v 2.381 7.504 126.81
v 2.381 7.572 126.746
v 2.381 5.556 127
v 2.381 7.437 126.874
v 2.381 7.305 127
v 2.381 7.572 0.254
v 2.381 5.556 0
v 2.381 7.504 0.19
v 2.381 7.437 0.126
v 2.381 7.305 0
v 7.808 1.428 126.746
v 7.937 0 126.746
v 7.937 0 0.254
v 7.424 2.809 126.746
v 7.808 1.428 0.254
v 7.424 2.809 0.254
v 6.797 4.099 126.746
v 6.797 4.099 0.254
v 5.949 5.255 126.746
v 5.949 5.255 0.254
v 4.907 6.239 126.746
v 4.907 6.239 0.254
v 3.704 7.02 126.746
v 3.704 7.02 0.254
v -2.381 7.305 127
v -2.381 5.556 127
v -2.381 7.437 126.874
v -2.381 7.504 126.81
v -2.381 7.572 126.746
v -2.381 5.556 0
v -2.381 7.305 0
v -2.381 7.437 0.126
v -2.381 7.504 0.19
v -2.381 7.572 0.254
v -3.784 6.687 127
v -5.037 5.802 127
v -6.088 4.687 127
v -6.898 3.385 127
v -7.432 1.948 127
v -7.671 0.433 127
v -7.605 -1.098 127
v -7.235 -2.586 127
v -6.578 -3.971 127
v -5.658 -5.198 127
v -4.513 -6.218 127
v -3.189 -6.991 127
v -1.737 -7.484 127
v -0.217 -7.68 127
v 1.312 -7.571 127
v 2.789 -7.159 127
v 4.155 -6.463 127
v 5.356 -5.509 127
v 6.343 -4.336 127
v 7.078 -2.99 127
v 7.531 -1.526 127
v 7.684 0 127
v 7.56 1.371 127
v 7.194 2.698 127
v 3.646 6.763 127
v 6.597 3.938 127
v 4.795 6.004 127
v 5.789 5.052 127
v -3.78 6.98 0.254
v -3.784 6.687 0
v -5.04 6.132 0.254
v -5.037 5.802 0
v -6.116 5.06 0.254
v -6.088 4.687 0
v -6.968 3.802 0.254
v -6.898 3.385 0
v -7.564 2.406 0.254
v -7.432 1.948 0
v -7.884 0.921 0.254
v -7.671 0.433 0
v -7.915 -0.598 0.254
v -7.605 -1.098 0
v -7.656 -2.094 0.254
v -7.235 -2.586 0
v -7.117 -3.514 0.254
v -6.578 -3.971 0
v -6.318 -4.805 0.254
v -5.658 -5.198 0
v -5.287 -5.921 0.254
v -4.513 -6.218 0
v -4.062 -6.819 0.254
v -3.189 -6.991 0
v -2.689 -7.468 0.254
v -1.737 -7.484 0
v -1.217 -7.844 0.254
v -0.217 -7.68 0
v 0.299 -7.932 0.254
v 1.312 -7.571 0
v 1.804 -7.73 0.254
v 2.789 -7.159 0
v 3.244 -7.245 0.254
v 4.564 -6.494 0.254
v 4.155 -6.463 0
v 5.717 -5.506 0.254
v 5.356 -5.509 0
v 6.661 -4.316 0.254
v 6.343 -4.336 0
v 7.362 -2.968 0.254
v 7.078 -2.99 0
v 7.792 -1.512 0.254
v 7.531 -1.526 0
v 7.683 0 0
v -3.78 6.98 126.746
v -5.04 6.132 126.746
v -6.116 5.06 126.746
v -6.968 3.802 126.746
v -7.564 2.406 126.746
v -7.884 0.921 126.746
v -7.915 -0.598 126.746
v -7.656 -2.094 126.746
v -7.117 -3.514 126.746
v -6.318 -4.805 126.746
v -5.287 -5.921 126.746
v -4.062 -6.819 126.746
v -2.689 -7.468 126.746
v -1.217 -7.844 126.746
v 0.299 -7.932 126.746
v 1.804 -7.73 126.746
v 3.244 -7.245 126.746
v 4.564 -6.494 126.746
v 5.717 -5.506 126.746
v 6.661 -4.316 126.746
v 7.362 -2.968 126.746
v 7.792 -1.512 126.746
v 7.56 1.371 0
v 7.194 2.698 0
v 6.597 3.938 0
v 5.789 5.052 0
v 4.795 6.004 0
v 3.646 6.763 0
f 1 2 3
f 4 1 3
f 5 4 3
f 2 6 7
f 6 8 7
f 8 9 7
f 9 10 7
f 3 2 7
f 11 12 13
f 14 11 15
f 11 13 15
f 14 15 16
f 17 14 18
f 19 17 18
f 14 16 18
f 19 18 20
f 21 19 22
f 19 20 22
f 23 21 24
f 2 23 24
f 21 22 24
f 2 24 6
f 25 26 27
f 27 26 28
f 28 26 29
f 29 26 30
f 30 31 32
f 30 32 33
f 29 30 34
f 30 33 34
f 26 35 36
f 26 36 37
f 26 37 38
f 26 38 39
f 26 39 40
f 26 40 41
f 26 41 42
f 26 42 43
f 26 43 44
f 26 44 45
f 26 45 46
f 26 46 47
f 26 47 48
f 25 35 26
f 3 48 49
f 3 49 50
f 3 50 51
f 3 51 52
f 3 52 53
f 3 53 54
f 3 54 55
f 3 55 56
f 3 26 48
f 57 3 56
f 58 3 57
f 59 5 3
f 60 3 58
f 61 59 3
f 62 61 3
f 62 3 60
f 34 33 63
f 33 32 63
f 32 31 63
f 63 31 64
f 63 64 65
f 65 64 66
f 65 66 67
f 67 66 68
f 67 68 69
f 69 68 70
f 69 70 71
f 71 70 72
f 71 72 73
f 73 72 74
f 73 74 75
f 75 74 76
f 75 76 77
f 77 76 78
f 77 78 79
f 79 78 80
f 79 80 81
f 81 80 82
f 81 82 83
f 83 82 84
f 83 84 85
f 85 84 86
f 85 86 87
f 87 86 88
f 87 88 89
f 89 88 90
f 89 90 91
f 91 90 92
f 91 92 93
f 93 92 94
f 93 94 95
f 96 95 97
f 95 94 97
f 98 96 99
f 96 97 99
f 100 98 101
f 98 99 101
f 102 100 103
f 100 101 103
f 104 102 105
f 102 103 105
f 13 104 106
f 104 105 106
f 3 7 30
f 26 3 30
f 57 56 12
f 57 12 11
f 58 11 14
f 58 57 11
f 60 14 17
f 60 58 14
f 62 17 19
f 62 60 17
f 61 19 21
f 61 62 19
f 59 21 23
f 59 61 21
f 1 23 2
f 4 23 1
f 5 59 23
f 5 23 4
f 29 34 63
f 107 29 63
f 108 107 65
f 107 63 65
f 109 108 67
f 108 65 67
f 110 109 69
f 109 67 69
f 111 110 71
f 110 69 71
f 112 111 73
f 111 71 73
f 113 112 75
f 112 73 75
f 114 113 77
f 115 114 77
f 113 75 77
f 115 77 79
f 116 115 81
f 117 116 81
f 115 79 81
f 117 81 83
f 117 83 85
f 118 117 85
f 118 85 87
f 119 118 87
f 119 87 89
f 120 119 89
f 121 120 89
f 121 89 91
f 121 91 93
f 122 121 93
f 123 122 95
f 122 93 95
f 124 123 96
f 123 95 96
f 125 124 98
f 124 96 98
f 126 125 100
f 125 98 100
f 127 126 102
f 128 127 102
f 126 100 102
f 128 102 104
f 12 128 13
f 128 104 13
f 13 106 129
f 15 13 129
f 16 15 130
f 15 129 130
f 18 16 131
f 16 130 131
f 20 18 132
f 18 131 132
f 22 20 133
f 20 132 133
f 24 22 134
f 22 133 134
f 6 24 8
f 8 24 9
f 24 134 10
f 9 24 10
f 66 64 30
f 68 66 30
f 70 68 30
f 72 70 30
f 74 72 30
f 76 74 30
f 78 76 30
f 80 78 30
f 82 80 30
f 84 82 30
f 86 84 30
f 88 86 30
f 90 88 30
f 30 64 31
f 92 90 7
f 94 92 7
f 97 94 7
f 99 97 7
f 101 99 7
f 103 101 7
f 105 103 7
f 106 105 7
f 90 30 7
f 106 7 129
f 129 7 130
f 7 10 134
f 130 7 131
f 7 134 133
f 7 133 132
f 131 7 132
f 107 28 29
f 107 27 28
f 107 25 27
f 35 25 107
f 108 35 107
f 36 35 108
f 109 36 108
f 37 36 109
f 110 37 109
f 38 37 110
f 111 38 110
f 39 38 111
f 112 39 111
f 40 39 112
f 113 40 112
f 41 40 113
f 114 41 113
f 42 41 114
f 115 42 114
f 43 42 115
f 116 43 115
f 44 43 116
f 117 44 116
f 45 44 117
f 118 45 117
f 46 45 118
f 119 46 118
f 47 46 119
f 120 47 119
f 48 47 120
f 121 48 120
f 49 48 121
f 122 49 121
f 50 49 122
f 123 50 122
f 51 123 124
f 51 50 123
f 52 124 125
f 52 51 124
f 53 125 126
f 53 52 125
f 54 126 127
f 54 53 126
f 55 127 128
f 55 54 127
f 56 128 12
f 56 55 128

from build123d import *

# Parameters (mm, degrees)
BOSS_EXTRUDE1_DEPTH = 127
CHAMFER1_SIZE       = 0.254


with BuildPart() as part:
    # Sketch1 → Boss-Extrude1 (new body)
    with BuildSketch(Plane.XY):
        with BuildLine():
            Line((2.38125, 5.55625), (-2.38125, 5.55625))
            Line((-2.38125, 5.55625), (-2.38125, 7.571892411))
            ThreePointArc((-2.38125, 7.571892411), (-4.695888328, -6.399417088), (7.9375, 0))
            ThreePointArc((7.9375, 0), (6.399417088, 4.695888328), (2.38125, 7.571892411))
            Line((2.38125, 7.571892411), (2.38125, 5.55625))
        make_face()
    extrude(amount=BOSS_EXTRUDE1_DEPTH)

    # Chamfer1
    chamfer1_edges = [part.edges().sort_by_distance(p)[0] for p in [
        (0, -7.9375, 0),
        (0, -7.9375, 127),
    ]]
    chamfer(chamfer1_edges, length=CHAMFER1_SIZE)


solid = part.part
